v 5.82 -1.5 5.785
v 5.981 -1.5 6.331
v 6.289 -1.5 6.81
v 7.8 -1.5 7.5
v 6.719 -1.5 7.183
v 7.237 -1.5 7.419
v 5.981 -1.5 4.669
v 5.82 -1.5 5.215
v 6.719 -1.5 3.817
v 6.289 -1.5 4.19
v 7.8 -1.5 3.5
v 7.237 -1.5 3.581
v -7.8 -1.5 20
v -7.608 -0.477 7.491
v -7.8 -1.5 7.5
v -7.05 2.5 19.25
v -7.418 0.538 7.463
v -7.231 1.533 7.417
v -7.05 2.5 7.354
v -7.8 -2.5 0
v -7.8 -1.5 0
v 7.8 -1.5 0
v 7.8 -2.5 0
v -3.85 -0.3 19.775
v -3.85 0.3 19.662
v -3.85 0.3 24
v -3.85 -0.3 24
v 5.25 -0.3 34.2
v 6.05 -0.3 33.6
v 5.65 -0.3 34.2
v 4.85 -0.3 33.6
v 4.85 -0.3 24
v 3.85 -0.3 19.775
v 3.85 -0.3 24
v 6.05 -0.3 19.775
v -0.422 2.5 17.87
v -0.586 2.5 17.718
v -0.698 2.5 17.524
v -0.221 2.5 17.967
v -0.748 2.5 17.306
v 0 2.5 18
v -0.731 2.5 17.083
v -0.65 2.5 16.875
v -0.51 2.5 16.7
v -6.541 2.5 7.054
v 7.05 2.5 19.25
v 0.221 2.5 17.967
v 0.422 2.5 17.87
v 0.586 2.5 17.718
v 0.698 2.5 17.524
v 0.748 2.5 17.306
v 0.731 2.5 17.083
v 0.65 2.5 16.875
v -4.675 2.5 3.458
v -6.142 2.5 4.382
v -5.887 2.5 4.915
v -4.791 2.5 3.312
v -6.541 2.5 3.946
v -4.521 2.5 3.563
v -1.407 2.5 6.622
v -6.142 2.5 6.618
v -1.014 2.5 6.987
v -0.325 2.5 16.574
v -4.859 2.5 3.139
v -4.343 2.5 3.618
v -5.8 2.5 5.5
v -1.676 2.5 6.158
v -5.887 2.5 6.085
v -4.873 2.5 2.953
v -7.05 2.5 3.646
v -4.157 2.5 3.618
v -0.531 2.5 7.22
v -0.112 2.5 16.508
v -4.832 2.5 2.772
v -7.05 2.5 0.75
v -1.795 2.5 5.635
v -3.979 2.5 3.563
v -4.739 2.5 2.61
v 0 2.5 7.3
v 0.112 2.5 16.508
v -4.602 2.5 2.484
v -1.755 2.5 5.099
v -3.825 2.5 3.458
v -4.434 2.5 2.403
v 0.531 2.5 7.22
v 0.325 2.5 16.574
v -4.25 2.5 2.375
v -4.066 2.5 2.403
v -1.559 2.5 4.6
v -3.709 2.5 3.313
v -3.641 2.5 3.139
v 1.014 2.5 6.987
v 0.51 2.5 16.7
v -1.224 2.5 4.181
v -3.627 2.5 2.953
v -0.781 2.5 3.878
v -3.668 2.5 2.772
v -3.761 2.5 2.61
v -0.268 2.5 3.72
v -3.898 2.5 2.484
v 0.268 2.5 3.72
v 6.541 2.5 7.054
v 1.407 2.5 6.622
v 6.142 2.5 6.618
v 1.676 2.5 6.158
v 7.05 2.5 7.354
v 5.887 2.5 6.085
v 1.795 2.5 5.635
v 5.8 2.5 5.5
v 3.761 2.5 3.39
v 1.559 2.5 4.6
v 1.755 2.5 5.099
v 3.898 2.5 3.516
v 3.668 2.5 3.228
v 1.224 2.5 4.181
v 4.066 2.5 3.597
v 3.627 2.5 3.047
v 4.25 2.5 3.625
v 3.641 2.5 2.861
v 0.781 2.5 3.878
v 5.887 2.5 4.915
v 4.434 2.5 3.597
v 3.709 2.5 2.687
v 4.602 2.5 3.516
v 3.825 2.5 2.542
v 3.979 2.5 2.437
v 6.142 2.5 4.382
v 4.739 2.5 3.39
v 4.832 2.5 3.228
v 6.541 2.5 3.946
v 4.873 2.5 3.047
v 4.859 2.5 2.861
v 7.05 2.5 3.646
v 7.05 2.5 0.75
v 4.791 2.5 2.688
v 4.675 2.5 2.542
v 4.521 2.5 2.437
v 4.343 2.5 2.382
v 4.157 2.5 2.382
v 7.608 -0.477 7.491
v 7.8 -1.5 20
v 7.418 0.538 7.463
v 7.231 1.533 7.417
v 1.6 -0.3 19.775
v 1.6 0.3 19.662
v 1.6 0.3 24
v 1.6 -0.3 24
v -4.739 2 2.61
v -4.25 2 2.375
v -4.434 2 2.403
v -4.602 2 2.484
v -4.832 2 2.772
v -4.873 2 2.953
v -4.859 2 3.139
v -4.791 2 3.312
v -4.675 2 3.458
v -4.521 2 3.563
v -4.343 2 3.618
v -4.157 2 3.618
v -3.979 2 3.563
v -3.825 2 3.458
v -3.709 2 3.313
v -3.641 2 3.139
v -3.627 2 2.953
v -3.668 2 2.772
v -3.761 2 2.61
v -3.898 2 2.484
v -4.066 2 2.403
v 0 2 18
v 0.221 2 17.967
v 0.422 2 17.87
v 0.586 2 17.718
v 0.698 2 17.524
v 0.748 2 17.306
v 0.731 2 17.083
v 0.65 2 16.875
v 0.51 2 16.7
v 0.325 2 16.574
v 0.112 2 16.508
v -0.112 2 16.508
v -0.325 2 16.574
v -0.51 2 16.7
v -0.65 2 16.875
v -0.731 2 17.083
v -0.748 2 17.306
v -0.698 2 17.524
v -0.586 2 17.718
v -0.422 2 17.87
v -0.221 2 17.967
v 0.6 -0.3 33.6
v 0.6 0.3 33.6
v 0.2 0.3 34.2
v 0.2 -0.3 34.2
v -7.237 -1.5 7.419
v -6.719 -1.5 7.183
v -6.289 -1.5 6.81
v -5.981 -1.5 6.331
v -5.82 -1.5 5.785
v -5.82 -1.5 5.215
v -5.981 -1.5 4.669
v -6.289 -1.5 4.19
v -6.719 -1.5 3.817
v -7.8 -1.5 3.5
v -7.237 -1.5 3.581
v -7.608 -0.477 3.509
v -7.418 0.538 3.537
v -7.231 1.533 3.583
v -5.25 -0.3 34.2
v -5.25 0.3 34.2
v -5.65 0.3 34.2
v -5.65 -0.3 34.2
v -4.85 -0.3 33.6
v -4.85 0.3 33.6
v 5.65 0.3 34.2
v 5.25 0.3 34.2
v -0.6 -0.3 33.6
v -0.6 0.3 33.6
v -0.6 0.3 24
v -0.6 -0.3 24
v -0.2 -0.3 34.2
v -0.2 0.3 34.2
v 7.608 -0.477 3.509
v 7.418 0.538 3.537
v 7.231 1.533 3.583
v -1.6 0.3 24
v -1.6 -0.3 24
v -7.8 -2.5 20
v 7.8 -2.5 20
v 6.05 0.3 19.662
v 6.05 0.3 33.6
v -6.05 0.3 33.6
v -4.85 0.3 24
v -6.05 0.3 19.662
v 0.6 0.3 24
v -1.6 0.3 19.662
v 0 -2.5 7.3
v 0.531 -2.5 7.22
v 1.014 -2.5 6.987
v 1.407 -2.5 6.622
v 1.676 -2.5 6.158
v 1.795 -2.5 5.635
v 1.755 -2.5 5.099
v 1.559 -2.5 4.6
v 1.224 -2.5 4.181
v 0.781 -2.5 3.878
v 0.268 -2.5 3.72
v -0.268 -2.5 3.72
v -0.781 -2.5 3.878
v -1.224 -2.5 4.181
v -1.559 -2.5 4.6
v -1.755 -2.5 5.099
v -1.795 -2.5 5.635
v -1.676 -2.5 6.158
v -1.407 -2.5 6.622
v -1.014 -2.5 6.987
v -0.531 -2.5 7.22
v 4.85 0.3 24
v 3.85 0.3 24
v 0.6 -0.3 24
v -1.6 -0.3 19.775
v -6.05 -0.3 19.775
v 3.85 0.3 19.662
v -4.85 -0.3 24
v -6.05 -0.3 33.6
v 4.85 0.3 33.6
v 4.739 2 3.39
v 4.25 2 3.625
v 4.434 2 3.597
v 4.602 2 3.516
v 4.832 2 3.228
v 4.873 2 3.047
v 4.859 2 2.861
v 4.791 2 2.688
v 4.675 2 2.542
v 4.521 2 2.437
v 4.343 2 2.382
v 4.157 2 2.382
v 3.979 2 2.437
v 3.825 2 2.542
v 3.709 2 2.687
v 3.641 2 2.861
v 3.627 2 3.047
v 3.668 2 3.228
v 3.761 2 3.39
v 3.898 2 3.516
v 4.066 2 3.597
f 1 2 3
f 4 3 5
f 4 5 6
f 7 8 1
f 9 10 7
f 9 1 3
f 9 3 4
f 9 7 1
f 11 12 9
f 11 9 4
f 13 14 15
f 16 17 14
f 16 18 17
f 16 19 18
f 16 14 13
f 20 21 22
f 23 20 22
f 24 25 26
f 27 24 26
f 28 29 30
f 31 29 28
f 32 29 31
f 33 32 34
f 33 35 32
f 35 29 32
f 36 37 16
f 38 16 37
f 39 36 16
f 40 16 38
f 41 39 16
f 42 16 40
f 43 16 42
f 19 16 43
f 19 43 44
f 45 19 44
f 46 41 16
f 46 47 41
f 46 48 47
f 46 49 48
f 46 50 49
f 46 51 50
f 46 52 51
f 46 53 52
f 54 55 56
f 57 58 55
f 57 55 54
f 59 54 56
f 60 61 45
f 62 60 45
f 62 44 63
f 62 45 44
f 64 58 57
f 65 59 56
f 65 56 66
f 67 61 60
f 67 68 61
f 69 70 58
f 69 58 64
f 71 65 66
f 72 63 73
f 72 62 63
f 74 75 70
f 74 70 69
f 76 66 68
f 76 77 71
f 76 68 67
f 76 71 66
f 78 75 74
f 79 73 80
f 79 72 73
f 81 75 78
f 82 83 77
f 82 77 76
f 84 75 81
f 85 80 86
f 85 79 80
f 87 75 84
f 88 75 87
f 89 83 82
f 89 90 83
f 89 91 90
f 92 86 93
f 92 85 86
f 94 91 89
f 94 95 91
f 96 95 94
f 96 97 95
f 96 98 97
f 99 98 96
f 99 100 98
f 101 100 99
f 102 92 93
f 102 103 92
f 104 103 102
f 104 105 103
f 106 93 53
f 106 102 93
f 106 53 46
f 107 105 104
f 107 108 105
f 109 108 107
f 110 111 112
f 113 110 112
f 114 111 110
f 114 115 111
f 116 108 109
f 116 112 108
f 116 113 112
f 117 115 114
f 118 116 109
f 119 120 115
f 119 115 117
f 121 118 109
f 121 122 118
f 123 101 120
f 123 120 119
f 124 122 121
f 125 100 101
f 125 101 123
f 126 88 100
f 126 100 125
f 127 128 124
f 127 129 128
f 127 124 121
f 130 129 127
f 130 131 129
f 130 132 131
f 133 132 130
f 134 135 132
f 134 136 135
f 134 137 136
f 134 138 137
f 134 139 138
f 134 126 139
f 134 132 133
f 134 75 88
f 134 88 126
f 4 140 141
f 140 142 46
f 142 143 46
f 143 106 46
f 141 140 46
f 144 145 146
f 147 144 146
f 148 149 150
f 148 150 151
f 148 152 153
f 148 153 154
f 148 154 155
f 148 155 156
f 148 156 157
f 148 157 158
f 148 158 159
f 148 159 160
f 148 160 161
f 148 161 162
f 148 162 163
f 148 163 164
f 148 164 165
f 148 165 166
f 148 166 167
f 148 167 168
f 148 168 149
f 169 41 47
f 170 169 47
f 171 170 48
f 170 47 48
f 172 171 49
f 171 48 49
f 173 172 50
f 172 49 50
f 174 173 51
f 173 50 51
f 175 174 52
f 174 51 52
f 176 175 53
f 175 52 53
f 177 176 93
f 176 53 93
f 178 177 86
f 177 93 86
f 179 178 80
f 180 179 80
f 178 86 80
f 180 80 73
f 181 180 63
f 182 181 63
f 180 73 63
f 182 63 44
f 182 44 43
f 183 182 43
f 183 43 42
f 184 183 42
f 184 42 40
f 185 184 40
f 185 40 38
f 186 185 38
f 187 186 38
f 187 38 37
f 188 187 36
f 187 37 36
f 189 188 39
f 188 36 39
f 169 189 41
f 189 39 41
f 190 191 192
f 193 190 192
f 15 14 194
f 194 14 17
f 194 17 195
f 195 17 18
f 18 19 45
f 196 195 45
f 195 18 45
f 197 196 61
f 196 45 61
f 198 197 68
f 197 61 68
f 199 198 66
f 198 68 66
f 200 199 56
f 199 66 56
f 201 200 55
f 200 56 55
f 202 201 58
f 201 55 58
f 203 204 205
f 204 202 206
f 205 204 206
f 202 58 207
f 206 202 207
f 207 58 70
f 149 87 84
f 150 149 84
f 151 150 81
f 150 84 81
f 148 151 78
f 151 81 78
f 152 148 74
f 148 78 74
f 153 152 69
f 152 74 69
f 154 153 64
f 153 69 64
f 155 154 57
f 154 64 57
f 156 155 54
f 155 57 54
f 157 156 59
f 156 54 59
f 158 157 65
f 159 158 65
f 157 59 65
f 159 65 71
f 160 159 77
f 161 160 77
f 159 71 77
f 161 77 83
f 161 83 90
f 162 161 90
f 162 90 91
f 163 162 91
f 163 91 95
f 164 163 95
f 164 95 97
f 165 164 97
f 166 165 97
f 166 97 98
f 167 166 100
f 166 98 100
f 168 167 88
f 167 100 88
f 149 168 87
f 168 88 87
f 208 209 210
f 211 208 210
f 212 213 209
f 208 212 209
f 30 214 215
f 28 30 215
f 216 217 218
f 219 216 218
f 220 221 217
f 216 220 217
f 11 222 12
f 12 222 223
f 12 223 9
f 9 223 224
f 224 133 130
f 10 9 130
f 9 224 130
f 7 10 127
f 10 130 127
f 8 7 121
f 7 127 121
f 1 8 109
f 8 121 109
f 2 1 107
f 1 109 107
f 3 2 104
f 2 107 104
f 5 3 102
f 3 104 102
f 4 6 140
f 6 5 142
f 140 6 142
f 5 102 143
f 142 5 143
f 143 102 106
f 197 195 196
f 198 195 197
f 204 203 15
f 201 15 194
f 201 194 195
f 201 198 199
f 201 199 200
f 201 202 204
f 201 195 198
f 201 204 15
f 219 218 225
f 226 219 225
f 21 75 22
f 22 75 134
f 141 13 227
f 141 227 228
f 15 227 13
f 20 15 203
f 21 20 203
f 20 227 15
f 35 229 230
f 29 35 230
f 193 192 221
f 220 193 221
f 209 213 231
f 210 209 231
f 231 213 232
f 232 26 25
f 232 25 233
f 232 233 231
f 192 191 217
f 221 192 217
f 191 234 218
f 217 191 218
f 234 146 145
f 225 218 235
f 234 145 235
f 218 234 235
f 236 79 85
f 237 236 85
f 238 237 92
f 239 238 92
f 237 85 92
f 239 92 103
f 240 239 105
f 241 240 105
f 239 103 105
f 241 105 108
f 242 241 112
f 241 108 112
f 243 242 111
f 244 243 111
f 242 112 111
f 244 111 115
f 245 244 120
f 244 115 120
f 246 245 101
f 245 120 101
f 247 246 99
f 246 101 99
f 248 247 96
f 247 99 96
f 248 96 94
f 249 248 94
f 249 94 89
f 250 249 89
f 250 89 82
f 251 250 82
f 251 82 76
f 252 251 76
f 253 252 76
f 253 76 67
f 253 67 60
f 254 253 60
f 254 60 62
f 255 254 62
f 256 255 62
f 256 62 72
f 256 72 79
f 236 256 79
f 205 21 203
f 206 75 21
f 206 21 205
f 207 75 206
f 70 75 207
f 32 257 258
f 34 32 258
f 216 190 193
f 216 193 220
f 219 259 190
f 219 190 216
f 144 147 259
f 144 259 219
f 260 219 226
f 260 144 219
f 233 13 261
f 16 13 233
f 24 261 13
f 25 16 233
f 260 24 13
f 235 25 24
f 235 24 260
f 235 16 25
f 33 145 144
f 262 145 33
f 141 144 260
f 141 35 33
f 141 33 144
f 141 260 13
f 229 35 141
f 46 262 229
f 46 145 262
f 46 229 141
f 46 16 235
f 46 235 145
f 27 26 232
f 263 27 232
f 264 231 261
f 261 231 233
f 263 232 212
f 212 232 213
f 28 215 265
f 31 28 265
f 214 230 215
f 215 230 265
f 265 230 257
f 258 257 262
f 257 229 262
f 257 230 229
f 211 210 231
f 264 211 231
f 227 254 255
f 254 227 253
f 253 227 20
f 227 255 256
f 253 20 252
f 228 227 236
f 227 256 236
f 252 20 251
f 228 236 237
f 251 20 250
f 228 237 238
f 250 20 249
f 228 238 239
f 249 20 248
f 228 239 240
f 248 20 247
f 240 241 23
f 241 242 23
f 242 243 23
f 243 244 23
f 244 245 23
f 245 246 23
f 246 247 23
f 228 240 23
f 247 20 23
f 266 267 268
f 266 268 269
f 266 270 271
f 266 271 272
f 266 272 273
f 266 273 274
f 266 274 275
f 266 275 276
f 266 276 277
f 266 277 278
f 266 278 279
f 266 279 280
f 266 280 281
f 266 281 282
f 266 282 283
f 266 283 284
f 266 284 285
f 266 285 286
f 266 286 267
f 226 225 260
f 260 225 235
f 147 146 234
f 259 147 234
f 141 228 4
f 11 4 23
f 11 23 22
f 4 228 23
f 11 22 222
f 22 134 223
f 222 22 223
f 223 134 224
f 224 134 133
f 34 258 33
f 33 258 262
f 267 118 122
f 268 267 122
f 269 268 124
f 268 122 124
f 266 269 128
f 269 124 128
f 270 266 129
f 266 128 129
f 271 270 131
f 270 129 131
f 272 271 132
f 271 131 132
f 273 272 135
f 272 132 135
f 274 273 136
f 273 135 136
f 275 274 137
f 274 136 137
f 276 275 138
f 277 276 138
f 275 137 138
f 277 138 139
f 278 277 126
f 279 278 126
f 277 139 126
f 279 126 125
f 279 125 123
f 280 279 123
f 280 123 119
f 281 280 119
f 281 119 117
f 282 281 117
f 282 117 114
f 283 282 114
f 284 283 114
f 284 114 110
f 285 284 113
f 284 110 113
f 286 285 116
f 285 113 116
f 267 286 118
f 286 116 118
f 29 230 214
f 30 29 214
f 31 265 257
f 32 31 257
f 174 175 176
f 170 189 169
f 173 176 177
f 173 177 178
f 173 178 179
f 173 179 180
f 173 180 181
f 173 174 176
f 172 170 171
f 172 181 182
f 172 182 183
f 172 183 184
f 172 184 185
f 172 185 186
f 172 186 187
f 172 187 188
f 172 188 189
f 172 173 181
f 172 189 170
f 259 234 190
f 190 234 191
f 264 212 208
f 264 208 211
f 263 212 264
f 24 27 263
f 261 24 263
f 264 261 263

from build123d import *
from OCP.BRepFilletAPI import BRepFilletAPI_MakeChamfer

# Parameters (mm, degrees)
SKETCH1_W                = 15.6
SKETCH1_H                = 5
BOSS_EXTRUDE1_DEPTH      = 20
CHAMFER1_SIZE            = 4
CHAMFER1_SIZE2           = 0.75
SKETCH2_R                = 1.8
CUT_EXTRUDE1_DEPTH       = 23.041778513
SKETCH3_R                = 2
CUT_EXTRUDE2_DEPTH       = 4
SKETCH4_R                = 0.625
CUT_EXTRUDE3_DEPTH       = 0.5
SKETCH5_R                = 0.75
CUT_EXTRUDE4_DEPTH       = 0.5
BOSS_EXTRUDE2_DEPTH      = 0.3
BOSS_EXTRUDE2_DEPTH_BACK = 0.3


with BuildPart() as part:
    # Sketch1 → Boss-Extrude1 (new body)
    with BuildSketch(Plane.XY):
        Rectangle(SKETCH1_W, SKETCH1_H)
    extrude(amount=BOSS_EXTRUDE1_DEPTH)

    # Chamfer1: one chamfer whose edges measure the first distance from different faces: ONE call of the kernel's chamfer builder (chamfer() names one face for all edges)
    chamfer1_edges_1 = [part.edges().sort_by_distance(p)[0] for p in [
        (0, 2.5, 20),
    ]]
    chamfer1_side_1 = [part.faces().sort_by_distance(p)[0] for p in [
        (0, 0, 20),
    ]]
    chamfer1_edges_2 = [part.edges().sort_by_distance(p)[0] for p in [
        (0, 2.5, 0),
    ]]
    chamfer1_side_2 = [part.faces().sort_by_distance(p)[0] for p in [
        (0, 0, 0),
    ]]
    chamfer1_edges_3 = [part.edges().sort_by_distance(p)[0] for p in [
        (-7.8, 2.5, 10),
    ]]
    chamfer1_side_3 = [part.faces().sort_by_distance(p)[0] for p in [
        (-7.8, 0, 10),
    ]]
    chamfer1_edges_4 = [part.edges().sort_by_distance(p)[0] for p in [
        (7.8, 2.5, 10),
    ]]
    chamfer1_side_4 = [part.faces().sort_by_distance(p)[0] for p in [
        (7.8, 0, 10),
    ]]
    chamfer1 = BRepFilletAPI_MakeChamfer(part.part.solid().wrapped)
    for e in chamfer1_edges_1:
        chamfer1.Add(CHAMFER1_SIZE, CHAMFER1_SIZE2, e.wrapped, chamfer1_side_1[0].wrapped)  # the first distance lies on this face
    for e in chamfer1_edges_2:
        chamfer1.Add(CHAMFER1_SIZE, CHAMFER1_SIZE2, e.wrapped, chamfer1_side_2[0].wrapped)  # the first distance lies on this face
    for e in chamfer1_edges_3:
        chamfer1.Add(CHAMFER1_SIZE, CHAMFER1_SIZE2, e.wrapped, chamfer1_side_3[0].wrapped)  # the first distance lies on this face
    for e in chamfer1_edges_4:
        chamfer1.Add(CHAMFER1_SIZE, CHAMFER1_SIZE2, e.wrapped, chamfer1_side_4[0].wrapped)  # the first distance lies on this face
    add(Compound.cast(chamfer1.Shape()), mode=Mode.REPLACE)

    # Sketch2 → Cut-Extrude1 (cut, through all)
    with BuildSketch(Plane(origin=(0, 2.5, 0), x_dir=(1, 0, 0), z_dir=(0, 1, 0))):
        with Locations(Location((0, -5.5, 0), (0, 0, 270))):
            Circle(SKETCH2_R)
    extrude(amount=-CUT_EXTRUDE1_DEPTH, mode=Mode.SUBTRACT)

    # Sketch3 → Cut-Extrude2 (cut)
    with BuildSketch(Plane(origin=(0, 2.5, 0), x_dir=(1, 0, 0), z_dir=(0, 1, 0))):
        with Locations((-7.8, -5.5)):
            Circle(SKETCH3_R)
        with Locations((7.8, -5.5)):
            Circle(SKETCH3_R)
    extrude(amount=-CUT_EXTRUDE2_DEPTH, mode=Mode.SUBTRACT)

    # Sketch4 → Cut-Extrude3 (cut)
    with BuildSketch(Plane(origin=(0, 2.5, 0), x_dir=(1, 0, 0), z_dir=(0, 1, 0))):
        with Locations(Location((4.25, -3, 0), (0, 0, 270))):
            Circle(SKETCH4_R)
        with Locations(Location((-4.25, -3, 0), (0, 0, 90))):
            Circle(SKETCH4_R)
    extrude(amount=-CUT_EXTRUDE3_DEPTH, mode=Mode.SUBTRACT)

    # Sketch5 → Cut-Extrude4 (cut)
    with BuildSketch(Plane(origin=(0, 2.5, 0), x_dir=(1, 0, 0), z_dir=(0, 1, 0))):
        with Locations(Location((0, -17.25, 0), (0, 0, 270))):
            Circle(SKETCH5_R)
    extrude(amount=-CUT_EXTRUDE4_DEPTH, mode=Mode.SUBTRACT)

    # Sketch6 → Boss-Extrude2 (add, two sides: drawn at the far end of the back side and taken through both)
    with BuildSketch(Plane(origin=(0, 0, 0), x_dir=(-1, 0, 0), z_dir=(0, -1, 0)).offset(-BOSS_EXTRUDE2_DEPTH_BACK)):
        Polygon((6.05, -24), (4.85, -24), (4.85, -33.6), (5.25, -34.2), (5.65, -34.2), (6.05, -33.6), align=None)
        Polygon((6.05, -19.25), (3.85, -19.25), (3.85, -20), (3.85, -24), (4.85, -24), (6.05, -24), (6.05, -20), align=None)
        Polygon((-1.6, -19.25), (-1.6, -24), (-0.6, -24), (0, -24), (0.6, -24), (1.6, -24), (1.6, -19.25), align=None)
        Polygon((-6.05, -20), (-6.05, -24), (-4.85, -24), (-3.85, -24), (-3.85, -20), (-3.85, -19.25), (-6.05, -19.25), align=None)
        Polygon((0.6, -24), (0, -24), (0, -34.2), (0.2, -34.2), (0.6, -33.6), align=None)
        Polygon((0, -24), (-0.6, -24), (-0.6, -33.6), (-0.2, -34.2), (0, -34.2), align=None)
        Polygon((-4.85, -24), (-6.05, -24), (-6.05, -33.6), (-5.65, -34.2), (-5.25, -34.2), (-4.85, -33.6), align=None)
    extrude(amount=BOSS_EXTRUDE2_DEPTH + BOSS_EXTRUDE2_DEPTH_BACK)


solid = part.part
